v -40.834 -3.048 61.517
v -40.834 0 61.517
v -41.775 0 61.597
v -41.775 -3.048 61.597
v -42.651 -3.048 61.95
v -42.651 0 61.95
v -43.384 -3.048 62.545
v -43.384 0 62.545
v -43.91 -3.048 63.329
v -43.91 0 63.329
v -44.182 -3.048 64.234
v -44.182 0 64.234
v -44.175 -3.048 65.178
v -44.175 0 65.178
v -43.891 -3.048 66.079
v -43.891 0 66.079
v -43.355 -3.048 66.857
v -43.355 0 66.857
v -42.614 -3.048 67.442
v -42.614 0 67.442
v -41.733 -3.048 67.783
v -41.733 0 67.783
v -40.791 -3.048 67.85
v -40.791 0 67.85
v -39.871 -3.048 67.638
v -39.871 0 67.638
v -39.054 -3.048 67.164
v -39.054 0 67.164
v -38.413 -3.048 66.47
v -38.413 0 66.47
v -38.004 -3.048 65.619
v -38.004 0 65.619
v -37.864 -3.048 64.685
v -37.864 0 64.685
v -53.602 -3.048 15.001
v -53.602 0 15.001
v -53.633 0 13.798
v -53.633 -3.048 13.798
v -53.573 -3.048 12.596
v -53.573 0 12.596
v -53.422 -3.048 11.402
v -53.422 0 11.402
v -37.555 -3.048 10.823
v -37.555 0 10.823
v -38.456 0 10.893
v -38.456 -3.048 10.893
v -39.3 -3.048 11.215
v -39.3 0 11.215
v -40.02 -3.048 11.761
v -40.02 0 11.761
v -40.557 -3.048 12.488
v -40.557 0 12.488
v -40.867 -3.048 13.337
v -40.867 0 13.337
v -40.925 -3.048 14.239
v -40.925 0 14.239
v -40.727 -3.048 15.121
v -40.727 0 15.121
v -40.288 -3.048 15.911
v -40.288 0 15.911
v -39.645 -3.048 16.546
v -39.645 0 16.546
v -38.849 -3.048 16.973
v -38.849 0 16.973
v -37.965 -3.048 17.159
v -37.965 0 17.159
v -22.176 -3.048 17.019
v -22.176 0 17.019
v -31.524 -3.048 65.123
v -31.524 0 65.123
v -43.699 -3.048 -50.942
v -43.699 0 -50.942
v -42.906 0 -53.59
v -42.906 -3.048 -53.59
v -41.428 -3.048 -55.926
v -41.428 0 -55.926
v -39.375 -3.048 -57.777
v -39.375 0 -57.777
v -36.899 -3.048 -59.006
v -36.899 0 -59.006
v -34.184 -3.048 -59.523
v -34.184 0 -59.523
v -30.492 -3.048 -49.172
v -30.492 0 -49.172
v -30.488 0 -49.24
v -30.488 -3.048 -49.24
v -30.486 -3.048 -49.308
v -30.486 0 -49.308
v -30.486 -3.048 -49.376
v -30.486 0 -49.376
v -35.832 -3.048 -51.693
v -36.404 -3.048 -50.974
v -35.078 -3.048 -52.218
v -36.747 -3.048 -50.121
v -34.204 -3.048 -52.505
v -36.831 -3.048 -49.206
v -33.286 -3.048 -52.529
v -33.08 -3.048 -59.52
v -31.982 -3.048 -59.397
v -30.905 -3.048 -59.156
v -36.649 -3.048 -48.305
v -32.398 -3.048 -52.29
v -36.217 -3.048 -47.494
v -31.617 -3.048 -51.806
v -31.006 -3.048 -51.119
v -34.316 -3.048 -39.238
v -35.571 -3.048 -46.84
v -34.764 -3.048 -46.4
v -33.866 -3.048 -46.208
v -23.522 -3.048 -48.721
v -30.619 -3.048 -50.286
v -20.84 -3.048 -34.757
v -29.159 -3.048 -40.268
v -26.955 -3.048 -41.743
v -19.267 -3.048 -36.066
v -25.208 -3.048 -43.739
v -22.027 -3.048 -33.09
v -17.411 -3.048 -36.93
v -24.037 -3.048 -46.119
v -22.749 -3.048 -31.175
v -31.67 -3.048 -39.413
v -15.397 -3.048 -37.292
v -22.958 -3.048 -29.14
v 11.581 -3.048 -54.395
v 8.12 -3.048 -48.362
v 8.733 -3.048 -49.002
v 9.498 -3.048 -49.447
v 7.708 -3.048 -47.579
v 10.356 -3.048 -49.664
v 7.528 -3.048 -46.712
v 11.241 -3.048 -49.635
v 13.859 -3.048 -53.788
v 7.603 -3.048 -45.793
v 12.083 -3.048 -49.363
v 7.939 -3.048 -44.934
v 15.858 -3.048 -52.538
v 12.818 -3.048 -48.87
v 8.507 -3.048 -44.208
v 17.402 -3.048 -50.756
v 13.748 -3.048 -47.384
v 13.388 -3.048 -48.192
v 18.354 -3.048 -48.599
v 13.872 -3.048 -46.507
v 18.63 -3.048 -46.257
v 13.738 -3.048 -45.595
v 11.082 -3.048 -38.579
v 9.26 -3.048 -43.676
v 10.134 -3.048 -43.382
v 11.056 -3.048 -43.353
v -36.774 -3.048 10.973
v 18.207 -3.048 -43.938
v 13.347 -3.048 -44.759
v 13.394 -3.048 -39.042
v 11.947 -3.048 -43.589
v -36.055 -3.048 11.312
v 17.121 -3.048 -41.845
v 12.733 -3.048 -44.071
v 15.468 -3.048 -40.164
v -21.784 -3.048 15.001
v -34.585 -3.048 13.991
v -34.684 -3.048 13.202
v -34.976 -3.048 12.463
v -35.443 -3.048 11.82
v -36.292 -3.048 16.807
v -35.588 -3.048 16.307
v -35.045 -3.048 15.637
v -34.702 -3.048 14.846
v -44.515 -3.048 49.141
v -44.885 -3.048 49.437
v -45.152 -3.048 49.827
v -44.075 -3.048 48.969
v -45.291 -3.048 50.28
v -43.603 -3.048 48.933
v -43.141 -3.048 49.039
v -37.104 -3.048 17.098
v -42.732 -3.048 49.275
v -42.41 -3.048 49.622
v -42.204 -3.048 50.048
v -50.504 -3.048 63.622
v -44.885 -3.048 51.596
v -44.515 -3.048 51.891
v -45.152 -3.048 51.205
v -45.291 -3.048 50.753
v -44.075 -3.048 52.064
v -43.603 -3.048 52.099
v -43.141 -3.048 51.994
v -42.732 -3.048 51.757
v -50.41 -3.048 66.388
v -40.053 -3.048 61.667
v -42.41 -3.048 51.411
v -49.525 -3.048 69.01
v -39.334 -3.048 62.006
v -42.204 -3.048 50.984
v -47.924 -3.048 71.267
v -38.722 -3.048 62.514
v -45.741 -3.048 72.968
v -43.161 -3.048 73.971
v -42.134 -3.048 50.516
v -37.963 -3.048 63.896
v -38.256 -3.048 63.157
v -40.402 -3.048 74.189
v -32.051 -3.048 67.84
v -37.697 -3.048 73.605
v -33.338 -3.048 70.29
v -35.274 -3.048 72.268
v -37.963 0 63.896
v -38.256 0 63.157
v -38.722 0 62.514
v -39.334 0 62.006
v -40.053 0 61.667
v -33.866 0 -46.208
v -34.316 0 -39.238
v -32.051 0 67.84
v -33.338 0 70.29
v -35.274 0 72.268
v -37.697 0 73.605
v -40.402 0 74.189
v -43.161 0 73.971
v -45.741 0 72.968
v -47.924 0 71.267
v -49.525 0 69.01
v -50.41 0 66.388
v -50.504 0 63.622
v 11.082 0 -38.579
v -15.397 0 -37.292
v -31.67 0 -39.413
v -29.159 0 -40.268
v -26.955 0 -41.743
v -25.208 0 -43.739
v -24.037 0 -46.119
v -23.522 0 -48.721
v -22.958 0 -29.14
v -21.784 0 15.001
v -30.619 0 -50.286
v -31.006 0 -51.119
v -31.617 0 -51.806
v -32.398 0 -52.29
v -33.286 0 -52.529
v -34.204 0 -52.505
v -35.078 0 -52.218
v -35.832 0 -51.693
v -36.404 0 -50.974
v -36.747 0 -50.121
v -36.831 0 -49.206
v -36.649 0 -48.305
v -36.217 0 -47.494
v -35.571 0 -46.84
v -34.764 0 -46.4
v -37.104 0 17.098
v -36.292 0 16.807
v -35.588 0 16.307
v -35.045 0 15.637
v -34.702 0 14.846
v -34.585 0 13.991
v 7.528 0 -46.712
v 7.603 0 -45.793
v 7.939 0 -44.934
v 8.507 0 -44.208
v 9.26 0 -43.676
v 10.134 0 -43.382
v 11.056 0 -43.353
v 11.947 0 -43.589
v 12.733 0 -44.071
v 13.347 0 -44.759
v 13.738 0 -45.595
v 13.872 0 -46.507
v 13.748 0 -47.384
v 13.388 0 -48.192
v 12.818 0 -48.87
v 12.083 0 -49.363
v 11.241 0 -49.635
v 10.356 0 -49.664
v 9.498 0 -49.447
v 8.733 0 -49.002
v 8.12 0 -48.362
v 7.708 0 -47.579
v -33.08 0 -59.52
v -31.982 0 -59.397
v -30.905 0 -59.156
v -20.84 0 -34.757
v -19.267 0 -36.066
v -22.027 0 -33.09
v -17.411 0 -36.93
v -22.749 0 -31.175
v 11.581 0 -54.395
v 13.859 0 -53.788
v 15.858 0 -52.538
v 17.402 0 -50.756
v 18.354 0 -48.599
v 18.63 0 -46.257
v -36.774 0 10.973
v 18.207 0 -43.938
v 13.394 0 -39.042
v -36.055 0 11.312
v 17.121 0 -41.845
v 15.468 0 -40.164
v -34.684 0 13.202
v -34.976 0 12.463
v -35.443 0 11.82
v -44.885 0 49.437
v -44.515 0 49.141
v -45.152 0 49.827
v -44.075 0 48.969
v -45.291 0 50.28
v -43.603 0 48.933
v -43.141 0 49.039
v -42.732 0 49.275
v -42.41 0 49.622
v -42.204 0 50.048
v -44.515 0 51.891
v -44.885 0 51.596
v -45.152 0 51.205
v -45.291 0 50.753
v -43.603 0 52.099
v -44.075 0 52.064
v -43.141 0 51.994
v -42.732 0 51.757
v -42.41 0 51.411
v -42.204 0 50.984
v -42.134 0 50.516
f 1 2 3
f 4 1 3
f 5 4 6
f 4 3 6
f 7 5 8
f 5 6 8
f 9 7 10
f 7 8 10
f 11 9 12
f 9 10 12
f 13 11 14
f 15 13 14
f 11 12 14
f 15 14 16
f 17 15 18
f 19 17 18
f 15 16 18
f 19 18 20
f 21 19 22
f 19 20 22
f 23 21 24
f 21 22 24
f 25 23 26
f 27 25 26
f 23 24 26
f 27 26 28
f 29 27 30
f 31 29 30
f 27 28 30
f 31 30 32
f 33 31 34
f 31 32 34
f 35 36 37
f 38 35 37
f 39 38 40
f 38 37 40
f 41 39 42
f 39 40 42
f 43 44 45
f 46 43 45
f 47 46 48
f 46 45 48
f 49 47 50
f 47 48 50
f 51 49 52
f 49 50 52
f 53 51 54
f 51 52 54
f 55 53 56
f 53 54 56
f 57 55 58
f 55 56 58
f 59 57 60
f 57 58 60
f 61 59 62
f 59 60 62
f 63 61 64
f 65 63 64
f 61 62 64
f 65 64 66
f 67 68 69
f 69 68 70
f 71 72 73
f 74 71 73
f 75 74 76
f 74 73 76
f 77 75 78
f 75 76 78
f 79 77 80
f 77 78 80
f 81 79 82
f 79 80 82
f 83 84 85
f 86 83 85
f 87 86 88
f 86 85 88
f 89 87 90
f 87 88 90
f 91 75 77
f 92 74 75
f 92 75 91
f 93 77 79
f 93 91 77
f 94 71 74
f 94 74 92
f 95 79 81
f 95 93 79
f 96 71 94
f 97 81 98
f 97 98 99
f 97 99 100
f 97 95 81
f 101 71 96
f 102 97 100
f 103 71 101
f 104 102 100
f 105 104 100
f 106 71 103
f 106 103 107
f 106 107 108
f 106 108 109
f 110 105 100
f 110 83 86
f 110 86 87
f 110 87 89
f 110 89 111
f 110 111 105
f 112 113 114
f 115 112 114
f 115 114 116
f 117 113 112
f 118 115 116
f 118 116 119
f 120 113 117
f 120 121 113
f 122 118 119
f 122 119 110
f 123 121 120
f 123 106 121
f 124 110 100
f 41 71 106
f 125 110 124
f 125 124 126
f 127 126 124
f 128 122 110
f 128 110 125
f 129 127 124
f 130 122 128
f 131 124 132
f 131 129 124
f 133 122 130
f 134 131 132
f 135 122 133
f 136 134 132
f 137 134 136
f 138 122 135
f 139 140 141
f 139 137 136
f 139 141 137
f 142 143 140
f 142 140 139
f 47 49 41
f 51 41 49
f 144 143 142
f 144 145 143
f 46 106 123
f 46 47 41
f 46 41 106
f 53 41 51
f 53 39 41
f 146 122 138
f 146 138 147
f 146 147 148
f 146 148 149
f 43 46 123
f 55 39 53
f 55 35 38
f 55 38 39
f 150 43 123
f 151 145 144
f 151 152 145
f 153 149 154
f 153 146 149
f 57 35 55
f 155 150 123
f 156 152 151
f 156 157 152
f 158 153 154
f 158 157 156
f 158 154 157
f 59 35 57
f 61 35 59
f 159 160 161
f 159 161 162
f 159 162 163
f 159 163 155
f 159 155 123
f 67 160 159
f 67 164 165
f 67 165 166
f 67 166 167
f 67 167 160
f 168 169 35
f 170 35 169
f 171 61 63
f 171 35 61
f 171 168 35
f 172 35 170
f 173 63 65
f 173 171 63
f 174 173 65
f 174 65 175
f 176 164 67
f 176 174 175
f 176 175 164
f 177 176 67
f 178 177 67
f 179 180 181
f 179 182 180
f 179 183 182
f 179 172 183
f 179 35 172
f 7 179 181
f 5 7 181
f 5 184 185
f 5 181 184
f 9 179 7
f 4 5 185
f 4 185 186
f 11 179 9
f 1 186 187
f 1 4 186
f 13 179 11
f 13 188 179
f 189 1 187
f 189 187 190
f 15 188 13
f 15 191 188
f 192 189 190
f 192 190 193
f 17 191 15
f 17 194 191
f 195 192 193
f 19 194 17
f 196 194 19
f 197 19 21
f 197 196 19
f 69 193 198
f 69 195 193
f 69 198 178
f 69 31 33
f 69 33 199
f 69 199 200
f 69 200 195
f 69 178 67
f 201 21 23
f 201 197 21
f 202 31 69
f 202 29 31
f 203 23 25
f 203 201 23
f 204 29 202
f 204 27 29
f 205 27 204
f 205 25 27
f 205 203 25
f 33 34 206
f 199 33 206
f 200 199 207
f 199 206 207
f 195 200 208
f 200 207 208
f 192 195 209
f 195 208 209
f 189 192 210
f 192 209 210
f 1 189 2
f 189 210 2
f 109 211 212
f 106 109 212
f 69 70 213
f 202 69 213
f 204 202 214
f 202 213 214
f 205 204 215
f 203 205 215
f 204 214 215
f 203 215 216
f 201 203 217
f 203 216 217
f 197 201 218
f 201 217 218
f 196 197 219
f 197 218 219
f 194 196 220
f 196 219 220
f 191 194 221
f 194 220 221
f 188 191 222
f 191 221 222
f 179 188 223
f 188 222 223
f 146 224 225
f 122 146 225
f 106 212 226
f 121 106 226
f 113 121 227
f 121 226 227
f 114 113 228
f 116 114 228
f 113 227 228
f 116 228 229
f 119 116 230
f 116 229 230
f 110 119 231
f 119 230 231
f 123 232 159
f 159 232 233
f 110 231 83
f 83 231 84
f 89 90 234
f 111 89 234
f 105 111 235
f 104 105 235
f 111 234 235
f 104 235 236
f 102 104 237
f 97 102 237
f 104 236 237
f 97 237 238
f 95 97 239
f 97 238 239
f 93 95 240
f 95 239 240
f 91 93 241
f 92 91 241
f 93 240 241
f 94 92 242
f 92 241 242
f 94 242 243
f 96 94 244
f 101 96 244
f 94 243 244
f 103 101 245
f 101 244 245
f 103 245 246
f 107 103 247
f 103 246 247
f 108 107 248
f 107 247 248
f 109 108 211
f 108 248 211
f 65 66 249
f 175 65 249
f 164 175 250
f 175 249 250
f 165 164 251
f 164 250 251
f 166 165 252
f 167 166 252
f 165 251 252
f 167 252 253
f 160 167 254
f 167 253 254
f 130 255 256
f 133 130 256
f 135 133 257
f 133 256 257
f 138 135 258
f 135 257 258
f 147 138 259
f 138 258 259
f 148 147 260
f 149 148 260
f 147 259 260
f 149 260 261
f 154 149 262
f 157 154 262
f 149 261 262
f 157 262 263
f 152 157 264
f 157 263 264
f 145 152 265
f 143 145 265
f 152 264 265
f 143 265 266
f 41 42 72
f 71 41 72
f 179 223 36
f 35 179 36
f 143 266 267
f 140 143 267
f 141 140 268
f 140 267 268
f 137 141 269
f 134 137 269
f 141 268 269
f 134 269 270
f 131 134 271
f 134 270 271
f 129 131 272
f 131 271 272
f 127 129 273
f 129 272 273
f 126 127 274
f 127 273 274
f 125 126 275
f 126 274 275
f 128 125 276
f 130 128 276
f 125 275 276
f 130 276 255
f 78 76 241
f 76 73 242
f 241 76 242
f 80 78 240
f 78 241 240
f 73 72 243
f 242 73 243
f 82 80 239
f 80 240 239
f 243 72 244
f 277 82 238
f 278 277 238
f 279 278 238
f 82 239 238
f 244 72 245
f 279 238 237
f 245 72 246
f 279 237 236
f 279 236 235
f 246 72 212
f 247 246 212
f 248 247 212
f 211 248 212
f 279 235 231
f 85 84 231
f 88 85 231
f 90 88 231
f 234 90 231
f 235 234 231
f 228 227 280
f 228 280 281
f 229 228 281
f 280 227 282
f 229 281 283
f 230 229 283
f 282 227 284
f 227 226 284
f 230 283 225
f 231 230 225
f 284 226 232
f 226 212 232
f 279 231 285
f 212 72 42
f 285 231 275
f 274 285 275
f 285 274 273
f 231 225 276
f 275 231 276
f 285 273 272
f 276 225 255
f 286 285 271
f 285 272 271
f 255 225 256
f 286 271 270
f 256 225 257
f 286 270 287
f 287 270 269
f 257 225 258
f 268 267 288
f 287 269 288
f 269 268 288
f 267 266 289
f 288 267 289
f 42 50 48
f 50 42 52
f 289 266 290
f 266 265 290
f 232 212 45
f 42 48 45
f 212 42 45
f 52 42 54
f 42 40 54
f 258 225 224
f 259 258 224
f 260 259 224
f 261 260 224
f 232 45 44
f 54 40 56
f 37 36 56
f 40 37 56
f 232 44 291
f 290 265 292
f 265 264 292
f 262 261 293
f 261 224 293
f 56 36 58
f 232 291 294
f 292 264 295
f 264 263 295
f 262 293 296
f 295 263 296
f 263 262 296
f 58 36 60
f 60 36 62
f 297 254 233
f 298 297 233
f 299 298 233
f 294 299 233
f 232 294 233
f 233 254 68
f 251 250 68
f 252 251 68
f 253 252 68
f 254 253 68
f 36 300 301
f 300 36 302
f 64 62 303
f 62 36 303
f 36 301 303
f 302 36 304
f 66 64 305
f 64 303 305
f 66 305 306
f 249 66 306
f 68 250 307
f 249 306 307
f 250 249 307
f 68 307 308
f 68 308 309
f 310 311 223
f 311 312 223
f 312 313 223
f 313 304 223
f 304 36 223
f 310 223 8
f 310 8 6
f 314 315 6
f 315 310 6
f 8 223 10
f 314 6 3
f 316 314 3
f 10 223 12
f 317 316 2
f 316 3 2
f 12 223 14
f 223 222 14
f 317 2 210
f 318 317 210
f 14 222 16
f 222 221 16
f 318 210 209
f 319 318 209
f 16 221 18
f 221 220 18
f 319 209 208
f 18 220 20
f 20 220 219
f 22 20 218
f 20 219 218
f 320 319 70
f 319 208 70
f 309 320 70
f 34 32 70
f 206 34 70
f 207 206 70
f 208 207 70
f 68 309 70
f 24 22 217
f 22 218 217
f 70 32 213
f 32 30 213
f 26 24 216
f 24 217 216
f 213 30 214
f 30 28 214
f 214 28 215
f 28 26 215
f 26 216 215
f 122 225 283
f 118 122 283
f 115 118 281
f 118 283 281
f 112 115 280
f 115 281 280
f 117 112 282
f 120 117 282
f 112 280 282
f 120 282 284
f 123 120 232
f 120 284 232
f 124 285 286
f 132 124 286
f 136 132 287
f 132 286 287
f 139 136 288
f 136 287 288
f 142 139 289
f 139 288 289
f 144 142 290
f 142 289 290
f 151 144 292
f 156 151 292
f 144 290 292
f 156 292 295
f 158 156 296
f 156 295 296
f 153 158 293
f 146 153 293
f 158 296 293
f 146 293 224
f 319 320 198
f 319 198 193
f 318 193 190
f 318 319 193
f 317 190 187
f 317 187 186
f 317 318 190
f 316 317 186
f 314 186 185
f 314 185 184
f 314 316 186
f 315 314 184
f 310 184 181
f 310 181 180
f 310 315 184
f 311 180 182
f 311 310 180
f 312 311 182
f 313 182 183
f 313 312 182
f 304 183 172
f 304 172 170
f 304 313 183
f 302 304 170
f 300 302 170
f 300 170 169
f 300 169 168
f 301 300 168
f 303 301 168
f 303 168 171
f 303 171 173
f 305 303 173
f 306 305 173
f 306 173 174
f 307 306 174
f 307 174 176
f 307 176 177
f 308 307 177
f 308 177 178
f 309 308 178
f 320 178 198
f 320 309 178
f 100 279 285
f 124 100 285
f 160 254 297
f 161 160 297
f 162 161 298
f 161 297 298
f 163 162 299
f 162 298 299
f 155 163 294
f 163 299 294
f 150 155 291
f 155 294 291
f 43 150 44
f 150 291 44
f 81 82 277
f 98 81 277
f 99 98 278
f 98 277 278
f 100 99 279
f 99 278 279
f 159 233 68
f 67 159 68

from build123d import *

# Parameters (mm, degrees)
F0_R     = 1.5875
F1_DEPTH = 3.048


with BuildPart() as f1:
    # F0 (on Front) → F1 (new body)
    with BuildSketch(Plane.XZ):
        with BuildLine():
            ThreePointArc((-50.5042680437, 63.6216618954), (-47.1542651109, 57.382604112), (-40.4239670527, 55.1800034394))
            ThreePointArc((-40.4239670527, 55.1800034394), (-34.0896459808, 58.1709562478), (-31.5138232961, 64.6851376731))
            ThreePointArc((-31.5138232961, 64.6851376731), (-31.5163410034, 64.9041262217), (-31.5238927941, 65.1229990015))
            ThreePointArc((-31.5238927941, 65.1229990015), (-41.7898995149, 74.1804791368), (-50.5042680437, 63.6216618954))
        make_face()
        with BuildLine():
            ThreePointArc((-37.8638232961, 64.6851376731), (-38.7224308577, 62.5137438647), (-40.833871215, 61.5167595952))
            ThreePointArc((-40.833871215, 61.5167595952), (-43.3552157345, 66.8565314815), (-37.8638232961, 64.6851376731))
        make_face(mode=Mode.SUBTRACT)
        with BuildLine():
            ThreePointArc((-31.5138232961, 64.6851376731), (-34.0896459808, 58.1709562478), (-40.4239670527, 55.1800034394))
            Line((-40.4239670527, 55.1800034394), (-38.7843504035, 29.8329788163))
            ThreePointArc((-38.7843504035, 29.8329788163), (-28.0623580194, 26.5600707626), (-22.1761003167, 17.0193675354))
            Line((-22.1761003167, 17.0193675354), (-31.5238927941, 65.1229990015))
            ThreePointArc((-31.5238927941, 65.1229990015), (-31.5163410034, 64.9041262217), (-31.5138232961, 64.6851376731))
        make_face()
        with BuildLine():
            Line((-38.7843504035, 29.8329788163), (-40.4239670527, 55.1800034394))
            ThreePointArc((-40.4239670527, 55.1800034394), (-47.1542651109, 57.382604112), (-50.5042680437, 63.6216618954))
            Line((-50.5042680437, 63.6216618954), (-53.60245848, 15.0006146799))
            ThreePointArc((-53.60245848, 15.0006146799), (-48.9903060277, 25.2110101047), (-38.7843504035, 29.8329788163))
        make_face()
        with Locations((-43.7214151025, 50.5162884269)):
            Circle(F0_R, mode=Mode.SUBTRACT)
        with BuildLine():
            ThreePointArc((-22.1761003167, 17.0193675354), (-28.0623580194, 26.5600707626), (-38.7843504035, 29.8329788163))
            Line((-38.7843504035, 29.8329788163), (-37.9645420789, 17.1594665048))
            ThreePointArc((-37.9645420789, 17.1594665048), (-35.5881961894, 16.3074808653), (-34.5845899978, 13.9910884269))
            ThreePointArc((-34.5845899978, 13.9910884269), (-35.4431975594, 11.8196946185), (-37.5546379166, 10.822710349))
            Line((-37.5546379166, 10.822710349), (-36.7348295921, -1.8508019626))
            ThreePointArc((-36.7348295921, -1.8508019626), (-26.1776278056, 3.1341193848), (-21.8845899978, 13.9910884269))
            ThreePointArc((-21.8845899978, 13.9910884269), (-21.9576356299, 15.5122271964), (-22.1761003167, 17.0193675354))
        make_face()
        with BuildLine():
            Line((-37.9645420789, 17.1594665048), (-38.7843504035, 29.8329788163))
            ThreePointArc((-38.7843504035, 29.8329788163), (-48.9903060277, 25.2110101047), (-53.60245848, 15.0006146799))
            ThreePointArc((-53.60245848, 15.0006146799), (-53.6146740156, 13.1961445378), (-53.4220280351, 11.4019457641))
            ThreePointArc((-53.4220280351, 11.4019457641), (-47.6324939367, 1.5596205806), (-36.7348295921, -1.8508019626))
            Line((-36.7348295921, -1.8508019626), (-37.5546379166, 10.822710349))
            ThreePointArc((-37.5546379166, 10.822710349), (-40.9279680757, 13.7861363457), (-37.9645420789, 17.1594665048))
        make_face()
        with BuildLine():
            Line((-21.7838038896, 15.0006146799), (-22.1761003167, 17.0193675354))
            ThreePointArc((-22.1761003167, 17.0193675354), (-21.9576356299, 15.5122271964), (-21.8845899978, 13.9910884269))
            ThreePointArc((-21.8845899978, 13.9910884269), (-26.1776278056, 3.1341193848), (-36.7348295921, -1.8508019626))
            Line((-36.7348295921, -1.8508019626), (-34.3163950346, -39.2376632816))
            ThreePointArc((-34.3163950346, -39.2376632816), (-26.9550807978, -41.7434983128), (-23.5217385257, -48.7206264712))
            Line((-23.5217385257, -48.7206264712), (2.7757995208, -47.0195241977))
            ThreePointArc((2.7757995208, -47.0195241977), (5.0392904077, -40.9396385387), (11.0821216178, -38.5790048126))
            Line((11.0821216178, -38.5790048126), (-15.3970316035, -37.2918863845))
            ThreePointArc((-15.3970316035, -37.2918863845), (-20.8399623866, -34.7574770434), (-22.9584246143, -29.1395731632))
            Line((-22.9584246143, -29.1395731632), (-21.7838038896, 15.0006146799))
        make_face()
        with BuildLine():
            ThreePointArc((-36.7348295921, -1.8508019626), (-47.6324939367, 1.5596205806), (-53.4220280351, 11.4019457641))
            Line((-53.4220280351, 11.4019457641), (-43.6992026963, -50.9420463215))
            ThreePointArc((-43.6992026963, -50.9420463215), (-41.5877946429, -43.0216036117), (-34.3163950346, -39.2376632816))
            Line((-34.3163950346, -39.2376632816), (-36.7348295921, -1.8508019626))
        make_face()
        with BuildLine():
            ThreePointArc((-34.3163950346, -39.2376632816), (-41.5877946429, -43.0216036117), (-43.6992026963, -50.9420463215))
            ThreePointArc((-43.6992026963, -50.9420463215), (-40.4647037817, -56.9216085968), (-34.1837836398, -59.5229909995))
            Line((-34.1837836398, -59.5229909995), (-30.9047285274, -59.1555864326))
            ThreePointArc((-30.9047285274, -59.1555864326), (-25.5604023993, -55.5094361321), (-23.5005483749, -49.3764731309))
            ThreePointArc((-23.5005483749, -49.3764731309), (-23.5058472944, -49.0483786843), (-23.5217385257, -48.7206264712))
            Line((-23.5217385257, -48.7206264712), (-30.492170297, -49.1715210497))
            ThreePointArc((-30.492170297, -49.1715210497), (-30.4872042872, -49.2739436163), (-30.4855483749, -49.3764731309))
            ThreePointArc((-30.4855483749, -49.3764731309), (-35.8319421833, -51.6928655693), (-33.865500456, -46.208095053))
            Line((-33.865500456, -46.208095053), (-34.3163950346, -39.2376632816))
        make_face()
        with BuildLine():
            Line((-30.9047285274, -59.1555864326), (-34.1837836398, -59.5229909995))
            ThreePointArc((-34.1837836398, -59.5229909995), (-32.5292416046, -59.4732916888), (-30.9047285274, -59.1555864326))
        make_face()
        with BuildLine():
            Line((2.7757995208, -47.0195241977), (-23.5217385257, -48.7206264712))
            ThreePointArc((-23.5217385257, -48.7206264712), (-23.5058472944, -49.0483786843), (-23.5005483749, -49.3764731309))
            ThreePointArc((-23.5005483749, -49.3764731309), (-25.5604023993, -55.5094361321), (-30.9047285274, -59.1555864326))
            Line((-30.9047285274, -59.1555864326), (11.5805781298, -54.3952834932))
            ThreePointArc((11.5805781298, -54.3952834932), (5.5996188736, -52.5918144379), (2.7757995208, -47.0195241977))
        make_face()
        with BuildLine():
            ThreePointArc((18.6342447155, -46.5071439948), (16.4440412718, -41.0324304367), (11.0821216178, -38.5790048126))
            ThreePointArc((11.0821216178, -38.5790048126), (5.0392904077, -40.9396385387), (2.7757995208, -47.0195241977))
            ThreePointArc((2.7757995208, -47.0195241977), (5.5996188736, -52.5918144379), (11.5805781298, -54.3952834932))
            ThreePointArc((11.5805781298, -54.3952834932), (16.6136414518, -51.7981022504), (18.6342447155, -46.5071439948))
        make_face()
        with BuildLine():
            ThreePointArc((13.8717447155, -46.5071439948), (10.7992742301, -49.6804880825), (7.5283666376, -46.712096076))
            ThreePointArc((7.5283666376, -46.712096076), (10.594215201, -43.3337999072), (13.8717447155, -46.5071439948))
        make_face(mode=Mode.SUBTRACT)
    extrude(amount=F1_DEPTH)


solid = f1.part
